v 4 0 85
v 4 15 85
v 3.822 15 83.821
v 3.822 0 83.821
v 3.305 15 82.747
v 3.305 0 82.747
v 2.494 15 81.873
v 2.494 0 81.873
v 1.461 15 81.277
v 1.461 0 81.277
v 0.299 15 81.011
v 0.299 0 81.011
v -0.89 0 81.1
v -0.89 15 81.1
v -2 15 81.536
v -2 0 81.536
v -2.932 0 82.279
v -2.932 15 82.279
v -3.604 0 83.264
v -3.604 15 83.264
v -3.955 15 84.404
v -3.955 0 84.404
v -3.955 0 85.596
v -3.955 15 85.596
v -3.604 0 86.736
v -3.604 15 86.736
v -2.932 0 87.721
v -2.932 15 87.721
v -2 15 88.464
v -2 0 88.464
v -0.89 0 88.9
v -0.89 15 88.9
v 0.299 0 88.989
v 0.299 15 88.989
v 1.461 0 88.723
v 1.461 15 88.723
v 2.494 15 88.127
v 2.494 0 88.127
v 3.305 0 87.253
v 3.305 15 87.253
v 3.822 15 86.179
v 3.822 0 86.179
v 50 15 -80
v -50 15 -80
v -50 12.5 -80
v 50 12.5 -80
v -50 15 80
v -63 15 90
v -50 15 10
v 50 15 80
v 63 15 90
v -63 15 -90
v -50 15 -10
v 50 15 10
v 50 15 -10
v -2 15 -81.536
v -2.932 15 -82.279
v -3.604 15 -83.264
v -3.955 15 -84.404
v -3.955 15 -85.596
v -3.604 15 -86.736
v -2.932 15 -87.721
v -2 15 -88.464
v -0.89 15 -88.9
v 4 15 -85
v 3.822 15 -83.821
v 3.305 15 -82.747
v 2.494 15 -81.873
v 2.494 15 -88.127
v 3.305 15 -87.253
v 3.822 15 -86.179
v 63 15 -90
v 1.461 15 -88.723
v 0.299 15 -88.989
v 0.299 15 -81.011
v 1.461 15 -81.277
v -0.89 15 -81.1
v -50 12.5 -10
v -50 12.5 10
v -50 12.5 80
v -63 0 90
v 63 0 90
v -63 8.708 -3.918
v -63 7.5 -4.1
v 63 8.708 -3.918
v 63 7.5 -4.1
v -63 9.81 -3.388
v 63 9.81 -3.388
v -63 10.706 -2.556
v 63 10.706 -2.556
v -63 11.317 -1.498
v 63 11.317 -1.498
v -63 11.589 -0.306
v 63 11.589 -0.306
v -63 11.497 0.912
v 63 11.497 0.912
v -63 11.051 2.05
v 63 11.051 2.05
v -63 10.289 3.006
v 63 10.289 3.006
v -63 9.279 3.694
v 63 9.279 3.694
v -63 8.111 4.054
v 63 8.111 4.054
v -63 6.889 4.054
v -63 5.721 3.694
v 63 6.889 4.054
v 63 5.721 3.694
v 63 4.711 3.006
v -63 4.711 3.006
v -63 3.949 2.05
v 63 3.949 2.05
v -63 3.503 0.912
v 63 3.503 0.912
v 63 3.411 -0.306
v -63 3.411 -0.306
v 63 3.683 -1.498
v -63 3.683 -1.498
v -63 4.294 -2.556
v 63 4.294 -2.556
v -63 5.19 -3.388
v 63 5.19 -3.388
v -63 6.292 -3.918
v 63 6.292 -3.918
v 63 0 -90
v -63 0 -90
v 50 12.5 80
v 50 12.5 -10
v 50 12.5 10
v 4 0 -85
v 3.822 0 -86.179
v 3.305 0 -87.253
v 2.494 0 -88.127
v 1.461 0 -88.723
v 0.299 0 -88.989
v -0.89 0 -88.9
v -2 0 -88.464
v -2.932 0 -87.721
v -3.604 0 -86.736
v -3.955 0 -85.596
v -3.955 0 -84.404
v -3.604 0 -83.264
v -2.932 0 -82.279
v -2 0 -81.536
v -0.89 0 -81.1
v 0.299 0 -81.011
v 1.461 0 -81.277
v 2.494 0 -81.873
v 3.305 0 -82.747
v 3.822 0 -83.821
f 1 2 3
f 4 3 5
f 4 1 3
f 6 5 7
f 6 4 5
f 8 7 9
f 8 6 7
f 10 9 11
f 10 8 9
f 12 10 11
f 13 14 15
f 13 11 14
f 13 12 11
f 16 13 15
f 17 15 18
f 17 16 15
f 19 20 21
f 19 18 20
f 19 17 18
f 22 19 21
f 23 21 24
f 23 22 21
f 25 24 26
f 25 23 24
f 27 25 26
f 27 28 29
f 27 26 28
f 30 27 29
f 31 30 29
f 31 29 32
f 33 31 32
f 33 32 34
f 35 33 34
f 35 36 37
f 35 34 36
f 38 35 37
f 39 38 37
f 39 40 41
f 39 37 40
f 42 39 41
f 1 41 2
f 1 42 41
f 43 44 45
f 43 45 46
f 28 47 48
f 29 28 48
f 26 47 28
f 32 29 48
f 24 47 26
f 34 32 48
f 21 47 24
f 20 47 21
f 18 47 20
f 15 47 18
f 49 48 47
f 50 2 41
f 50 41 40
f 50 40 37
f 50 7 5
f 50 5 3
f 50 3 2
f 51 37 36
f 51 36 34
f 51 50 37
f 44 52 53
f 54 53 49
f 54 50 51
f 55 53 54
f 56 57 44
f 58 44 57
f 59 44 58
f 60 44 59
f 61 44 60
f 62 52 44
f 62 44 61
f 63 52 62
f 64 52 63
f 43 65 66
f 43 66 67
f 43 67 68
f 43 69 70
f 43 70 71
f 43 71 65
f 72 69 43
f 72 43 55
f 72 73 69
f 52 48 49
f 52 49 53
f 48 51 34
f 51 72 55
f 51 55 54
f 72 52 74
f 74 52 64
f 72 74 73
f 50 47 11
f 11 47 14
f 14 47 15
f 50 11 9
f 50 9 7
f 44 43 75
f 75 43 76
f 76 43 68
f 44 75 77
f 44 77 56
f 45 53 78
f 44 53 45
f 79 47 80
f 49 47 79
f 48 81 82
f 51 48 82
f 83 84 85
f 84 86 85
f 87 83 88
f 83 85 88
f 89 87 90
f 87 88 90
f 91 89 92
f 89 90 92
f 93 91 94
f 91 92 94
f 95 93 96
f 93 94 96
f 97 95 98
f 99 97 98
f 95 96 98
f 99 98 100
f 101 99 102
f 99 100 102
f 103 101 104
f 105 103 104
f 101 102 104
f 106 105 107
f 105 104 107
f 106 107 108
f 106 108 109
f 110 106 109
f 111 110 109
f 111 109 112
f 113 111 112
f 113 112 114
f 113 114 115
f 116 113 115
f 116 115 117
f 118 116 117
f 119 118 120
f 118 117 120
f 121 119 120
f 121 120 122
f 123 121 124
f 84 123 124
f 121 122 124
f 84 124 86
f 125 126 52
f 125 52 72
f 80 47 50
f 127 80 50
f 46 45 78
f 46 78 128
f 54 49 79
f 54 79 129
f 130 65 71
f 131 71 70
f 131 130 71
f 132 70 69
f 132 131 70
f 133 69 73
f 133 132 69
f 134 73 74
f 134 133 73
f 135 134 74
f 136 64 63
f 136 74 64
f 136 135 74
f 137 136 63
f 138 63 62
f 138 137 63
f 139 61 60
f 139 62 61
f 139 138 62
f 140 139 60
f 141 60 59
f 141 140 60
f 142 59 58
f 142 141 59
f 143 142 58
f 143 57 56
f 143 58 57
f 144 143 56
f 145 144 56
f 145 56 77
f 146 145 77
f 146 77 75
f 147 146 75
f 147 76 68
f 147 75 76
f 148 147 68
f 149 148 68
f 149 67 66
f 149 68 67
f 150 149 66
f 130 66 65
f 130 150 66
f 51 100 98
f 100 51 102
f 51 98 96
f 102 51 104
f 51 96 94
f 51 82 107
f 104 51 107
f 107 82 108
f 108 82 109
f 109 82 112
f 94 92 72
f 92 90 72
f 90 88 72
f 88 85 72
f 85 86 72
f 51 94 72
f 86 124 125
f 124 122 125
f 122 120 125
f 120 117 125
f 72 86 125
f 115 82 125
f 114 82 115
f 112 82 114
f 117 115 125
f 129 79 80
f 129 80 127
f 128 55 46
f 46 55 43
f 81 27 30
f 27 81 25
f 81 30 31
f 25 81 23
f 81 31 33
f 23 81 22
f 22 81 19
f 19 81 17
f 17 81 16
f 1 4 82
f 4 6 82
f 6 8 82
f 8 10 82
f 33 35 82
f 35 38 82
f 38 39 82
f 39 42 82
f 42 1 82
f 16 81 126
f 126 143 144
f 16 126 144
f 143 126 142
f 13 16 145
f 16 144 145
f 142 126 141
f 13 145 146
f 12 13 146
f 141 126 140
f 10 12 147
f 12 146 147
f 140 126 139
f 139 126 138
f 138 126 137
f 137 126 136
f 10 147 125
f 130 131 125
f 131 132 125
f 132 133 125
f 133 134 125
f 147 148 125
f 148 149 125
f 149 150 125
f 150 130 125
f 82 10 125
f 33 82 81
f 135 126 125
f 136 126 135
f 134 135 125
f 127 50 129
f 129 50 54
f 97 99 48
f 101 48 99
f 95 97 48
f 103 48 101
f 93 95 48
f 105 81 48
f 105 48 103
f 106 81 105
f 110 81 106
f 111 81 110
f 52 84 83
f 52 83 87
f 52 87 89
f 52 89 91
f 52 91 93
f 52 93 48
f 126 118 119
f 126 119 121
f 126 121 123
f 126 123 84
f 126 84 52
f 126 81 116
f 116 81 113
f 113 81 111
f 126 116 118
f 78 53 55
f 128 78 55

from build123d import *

# Parameters (mm, degrees)
SKETCH1_W               = 126
SKETCH1_H               = 180
BOSS_EXTRUDE1_DEPTH     = 15
SKETCH2_W               = 100
SKETCH2_H               = 70
CUT_EXTRUDE1_DEPTH      = 2.5
SKETCH4_R               = 4
CUT_EXTRUDE3_DEPTH      = 32.5
SKETCH5_R               = 4.1
CUT_EXTRUDE4_DEPTH      = 64
CUT_EXTRUDE4_DEPTH_BACK = 64


with BuildPart() as part:
    # Sketch1 → Boss-Extrude1 (new body)
    with BuildSketch(Plane(origin=(0, 0, 0), x_dir=(1, 0, 0), z_dir=(0, 1, 0))):
        Rectangle(SKETCH1_W, SKETCH1_H)
    extrude(amount=BOSS_EXTRUDE1_DEPTH)

    # Sketch2 → Cut-Extrude1 (cut)
    with BuildSketch(Plane(origin=(0, 15, 0), x_dir=(1, 0, 0), z_dir=(0, 1, 0))):
        with Locations((0, -45)):
            Rectangle(SKETCH2_W, SKETCH2_H)
        with Locations((0, 45)):
            Rectangle(SKETCH2_W, SKETCH2_H)
    extrude(amount=-CUT_EXTRUDE1_DEPTH, mode=Mode.SUBTRACT)

    # Sketch4 → Cut-Extrude3 (cut)
    with BuildSketch(Plane(origin=(0, 0, 0), x_dir=(1, 0, 0), z_dir=(0, 1, 0))):
        with Locations((0, -85)):
            Circle(SKETCH4_R)
        with Locations((0, 85)):
            Circle(SKETCH4_R)
    extrude(amount=CUT_EXTRUDE3_DEPTH, mode=Mode.SUBTRACT)

    # Sketch5 → Cut-Extrude4 (cut, two sides)
    with BuildSketch(Plane(origin=(0, 0, 0), x_dir=(0, 0, -1), z_dir=(1, 0, 0))) as cut_extrude4_sk:
        with Locations((0, 7.5)):
            Circle(SKETCH5_R)
    extrude(amount=CUT_EXTRUDE4_DEPTH, mode=Mode.SUBTRACT)
    extrude(cut_extrude4_sk.sketch, amount=-CUT_EXTRUDE4_DEPTH_BACK, mode=Mode.SUBTRACT)


solid = part.part
